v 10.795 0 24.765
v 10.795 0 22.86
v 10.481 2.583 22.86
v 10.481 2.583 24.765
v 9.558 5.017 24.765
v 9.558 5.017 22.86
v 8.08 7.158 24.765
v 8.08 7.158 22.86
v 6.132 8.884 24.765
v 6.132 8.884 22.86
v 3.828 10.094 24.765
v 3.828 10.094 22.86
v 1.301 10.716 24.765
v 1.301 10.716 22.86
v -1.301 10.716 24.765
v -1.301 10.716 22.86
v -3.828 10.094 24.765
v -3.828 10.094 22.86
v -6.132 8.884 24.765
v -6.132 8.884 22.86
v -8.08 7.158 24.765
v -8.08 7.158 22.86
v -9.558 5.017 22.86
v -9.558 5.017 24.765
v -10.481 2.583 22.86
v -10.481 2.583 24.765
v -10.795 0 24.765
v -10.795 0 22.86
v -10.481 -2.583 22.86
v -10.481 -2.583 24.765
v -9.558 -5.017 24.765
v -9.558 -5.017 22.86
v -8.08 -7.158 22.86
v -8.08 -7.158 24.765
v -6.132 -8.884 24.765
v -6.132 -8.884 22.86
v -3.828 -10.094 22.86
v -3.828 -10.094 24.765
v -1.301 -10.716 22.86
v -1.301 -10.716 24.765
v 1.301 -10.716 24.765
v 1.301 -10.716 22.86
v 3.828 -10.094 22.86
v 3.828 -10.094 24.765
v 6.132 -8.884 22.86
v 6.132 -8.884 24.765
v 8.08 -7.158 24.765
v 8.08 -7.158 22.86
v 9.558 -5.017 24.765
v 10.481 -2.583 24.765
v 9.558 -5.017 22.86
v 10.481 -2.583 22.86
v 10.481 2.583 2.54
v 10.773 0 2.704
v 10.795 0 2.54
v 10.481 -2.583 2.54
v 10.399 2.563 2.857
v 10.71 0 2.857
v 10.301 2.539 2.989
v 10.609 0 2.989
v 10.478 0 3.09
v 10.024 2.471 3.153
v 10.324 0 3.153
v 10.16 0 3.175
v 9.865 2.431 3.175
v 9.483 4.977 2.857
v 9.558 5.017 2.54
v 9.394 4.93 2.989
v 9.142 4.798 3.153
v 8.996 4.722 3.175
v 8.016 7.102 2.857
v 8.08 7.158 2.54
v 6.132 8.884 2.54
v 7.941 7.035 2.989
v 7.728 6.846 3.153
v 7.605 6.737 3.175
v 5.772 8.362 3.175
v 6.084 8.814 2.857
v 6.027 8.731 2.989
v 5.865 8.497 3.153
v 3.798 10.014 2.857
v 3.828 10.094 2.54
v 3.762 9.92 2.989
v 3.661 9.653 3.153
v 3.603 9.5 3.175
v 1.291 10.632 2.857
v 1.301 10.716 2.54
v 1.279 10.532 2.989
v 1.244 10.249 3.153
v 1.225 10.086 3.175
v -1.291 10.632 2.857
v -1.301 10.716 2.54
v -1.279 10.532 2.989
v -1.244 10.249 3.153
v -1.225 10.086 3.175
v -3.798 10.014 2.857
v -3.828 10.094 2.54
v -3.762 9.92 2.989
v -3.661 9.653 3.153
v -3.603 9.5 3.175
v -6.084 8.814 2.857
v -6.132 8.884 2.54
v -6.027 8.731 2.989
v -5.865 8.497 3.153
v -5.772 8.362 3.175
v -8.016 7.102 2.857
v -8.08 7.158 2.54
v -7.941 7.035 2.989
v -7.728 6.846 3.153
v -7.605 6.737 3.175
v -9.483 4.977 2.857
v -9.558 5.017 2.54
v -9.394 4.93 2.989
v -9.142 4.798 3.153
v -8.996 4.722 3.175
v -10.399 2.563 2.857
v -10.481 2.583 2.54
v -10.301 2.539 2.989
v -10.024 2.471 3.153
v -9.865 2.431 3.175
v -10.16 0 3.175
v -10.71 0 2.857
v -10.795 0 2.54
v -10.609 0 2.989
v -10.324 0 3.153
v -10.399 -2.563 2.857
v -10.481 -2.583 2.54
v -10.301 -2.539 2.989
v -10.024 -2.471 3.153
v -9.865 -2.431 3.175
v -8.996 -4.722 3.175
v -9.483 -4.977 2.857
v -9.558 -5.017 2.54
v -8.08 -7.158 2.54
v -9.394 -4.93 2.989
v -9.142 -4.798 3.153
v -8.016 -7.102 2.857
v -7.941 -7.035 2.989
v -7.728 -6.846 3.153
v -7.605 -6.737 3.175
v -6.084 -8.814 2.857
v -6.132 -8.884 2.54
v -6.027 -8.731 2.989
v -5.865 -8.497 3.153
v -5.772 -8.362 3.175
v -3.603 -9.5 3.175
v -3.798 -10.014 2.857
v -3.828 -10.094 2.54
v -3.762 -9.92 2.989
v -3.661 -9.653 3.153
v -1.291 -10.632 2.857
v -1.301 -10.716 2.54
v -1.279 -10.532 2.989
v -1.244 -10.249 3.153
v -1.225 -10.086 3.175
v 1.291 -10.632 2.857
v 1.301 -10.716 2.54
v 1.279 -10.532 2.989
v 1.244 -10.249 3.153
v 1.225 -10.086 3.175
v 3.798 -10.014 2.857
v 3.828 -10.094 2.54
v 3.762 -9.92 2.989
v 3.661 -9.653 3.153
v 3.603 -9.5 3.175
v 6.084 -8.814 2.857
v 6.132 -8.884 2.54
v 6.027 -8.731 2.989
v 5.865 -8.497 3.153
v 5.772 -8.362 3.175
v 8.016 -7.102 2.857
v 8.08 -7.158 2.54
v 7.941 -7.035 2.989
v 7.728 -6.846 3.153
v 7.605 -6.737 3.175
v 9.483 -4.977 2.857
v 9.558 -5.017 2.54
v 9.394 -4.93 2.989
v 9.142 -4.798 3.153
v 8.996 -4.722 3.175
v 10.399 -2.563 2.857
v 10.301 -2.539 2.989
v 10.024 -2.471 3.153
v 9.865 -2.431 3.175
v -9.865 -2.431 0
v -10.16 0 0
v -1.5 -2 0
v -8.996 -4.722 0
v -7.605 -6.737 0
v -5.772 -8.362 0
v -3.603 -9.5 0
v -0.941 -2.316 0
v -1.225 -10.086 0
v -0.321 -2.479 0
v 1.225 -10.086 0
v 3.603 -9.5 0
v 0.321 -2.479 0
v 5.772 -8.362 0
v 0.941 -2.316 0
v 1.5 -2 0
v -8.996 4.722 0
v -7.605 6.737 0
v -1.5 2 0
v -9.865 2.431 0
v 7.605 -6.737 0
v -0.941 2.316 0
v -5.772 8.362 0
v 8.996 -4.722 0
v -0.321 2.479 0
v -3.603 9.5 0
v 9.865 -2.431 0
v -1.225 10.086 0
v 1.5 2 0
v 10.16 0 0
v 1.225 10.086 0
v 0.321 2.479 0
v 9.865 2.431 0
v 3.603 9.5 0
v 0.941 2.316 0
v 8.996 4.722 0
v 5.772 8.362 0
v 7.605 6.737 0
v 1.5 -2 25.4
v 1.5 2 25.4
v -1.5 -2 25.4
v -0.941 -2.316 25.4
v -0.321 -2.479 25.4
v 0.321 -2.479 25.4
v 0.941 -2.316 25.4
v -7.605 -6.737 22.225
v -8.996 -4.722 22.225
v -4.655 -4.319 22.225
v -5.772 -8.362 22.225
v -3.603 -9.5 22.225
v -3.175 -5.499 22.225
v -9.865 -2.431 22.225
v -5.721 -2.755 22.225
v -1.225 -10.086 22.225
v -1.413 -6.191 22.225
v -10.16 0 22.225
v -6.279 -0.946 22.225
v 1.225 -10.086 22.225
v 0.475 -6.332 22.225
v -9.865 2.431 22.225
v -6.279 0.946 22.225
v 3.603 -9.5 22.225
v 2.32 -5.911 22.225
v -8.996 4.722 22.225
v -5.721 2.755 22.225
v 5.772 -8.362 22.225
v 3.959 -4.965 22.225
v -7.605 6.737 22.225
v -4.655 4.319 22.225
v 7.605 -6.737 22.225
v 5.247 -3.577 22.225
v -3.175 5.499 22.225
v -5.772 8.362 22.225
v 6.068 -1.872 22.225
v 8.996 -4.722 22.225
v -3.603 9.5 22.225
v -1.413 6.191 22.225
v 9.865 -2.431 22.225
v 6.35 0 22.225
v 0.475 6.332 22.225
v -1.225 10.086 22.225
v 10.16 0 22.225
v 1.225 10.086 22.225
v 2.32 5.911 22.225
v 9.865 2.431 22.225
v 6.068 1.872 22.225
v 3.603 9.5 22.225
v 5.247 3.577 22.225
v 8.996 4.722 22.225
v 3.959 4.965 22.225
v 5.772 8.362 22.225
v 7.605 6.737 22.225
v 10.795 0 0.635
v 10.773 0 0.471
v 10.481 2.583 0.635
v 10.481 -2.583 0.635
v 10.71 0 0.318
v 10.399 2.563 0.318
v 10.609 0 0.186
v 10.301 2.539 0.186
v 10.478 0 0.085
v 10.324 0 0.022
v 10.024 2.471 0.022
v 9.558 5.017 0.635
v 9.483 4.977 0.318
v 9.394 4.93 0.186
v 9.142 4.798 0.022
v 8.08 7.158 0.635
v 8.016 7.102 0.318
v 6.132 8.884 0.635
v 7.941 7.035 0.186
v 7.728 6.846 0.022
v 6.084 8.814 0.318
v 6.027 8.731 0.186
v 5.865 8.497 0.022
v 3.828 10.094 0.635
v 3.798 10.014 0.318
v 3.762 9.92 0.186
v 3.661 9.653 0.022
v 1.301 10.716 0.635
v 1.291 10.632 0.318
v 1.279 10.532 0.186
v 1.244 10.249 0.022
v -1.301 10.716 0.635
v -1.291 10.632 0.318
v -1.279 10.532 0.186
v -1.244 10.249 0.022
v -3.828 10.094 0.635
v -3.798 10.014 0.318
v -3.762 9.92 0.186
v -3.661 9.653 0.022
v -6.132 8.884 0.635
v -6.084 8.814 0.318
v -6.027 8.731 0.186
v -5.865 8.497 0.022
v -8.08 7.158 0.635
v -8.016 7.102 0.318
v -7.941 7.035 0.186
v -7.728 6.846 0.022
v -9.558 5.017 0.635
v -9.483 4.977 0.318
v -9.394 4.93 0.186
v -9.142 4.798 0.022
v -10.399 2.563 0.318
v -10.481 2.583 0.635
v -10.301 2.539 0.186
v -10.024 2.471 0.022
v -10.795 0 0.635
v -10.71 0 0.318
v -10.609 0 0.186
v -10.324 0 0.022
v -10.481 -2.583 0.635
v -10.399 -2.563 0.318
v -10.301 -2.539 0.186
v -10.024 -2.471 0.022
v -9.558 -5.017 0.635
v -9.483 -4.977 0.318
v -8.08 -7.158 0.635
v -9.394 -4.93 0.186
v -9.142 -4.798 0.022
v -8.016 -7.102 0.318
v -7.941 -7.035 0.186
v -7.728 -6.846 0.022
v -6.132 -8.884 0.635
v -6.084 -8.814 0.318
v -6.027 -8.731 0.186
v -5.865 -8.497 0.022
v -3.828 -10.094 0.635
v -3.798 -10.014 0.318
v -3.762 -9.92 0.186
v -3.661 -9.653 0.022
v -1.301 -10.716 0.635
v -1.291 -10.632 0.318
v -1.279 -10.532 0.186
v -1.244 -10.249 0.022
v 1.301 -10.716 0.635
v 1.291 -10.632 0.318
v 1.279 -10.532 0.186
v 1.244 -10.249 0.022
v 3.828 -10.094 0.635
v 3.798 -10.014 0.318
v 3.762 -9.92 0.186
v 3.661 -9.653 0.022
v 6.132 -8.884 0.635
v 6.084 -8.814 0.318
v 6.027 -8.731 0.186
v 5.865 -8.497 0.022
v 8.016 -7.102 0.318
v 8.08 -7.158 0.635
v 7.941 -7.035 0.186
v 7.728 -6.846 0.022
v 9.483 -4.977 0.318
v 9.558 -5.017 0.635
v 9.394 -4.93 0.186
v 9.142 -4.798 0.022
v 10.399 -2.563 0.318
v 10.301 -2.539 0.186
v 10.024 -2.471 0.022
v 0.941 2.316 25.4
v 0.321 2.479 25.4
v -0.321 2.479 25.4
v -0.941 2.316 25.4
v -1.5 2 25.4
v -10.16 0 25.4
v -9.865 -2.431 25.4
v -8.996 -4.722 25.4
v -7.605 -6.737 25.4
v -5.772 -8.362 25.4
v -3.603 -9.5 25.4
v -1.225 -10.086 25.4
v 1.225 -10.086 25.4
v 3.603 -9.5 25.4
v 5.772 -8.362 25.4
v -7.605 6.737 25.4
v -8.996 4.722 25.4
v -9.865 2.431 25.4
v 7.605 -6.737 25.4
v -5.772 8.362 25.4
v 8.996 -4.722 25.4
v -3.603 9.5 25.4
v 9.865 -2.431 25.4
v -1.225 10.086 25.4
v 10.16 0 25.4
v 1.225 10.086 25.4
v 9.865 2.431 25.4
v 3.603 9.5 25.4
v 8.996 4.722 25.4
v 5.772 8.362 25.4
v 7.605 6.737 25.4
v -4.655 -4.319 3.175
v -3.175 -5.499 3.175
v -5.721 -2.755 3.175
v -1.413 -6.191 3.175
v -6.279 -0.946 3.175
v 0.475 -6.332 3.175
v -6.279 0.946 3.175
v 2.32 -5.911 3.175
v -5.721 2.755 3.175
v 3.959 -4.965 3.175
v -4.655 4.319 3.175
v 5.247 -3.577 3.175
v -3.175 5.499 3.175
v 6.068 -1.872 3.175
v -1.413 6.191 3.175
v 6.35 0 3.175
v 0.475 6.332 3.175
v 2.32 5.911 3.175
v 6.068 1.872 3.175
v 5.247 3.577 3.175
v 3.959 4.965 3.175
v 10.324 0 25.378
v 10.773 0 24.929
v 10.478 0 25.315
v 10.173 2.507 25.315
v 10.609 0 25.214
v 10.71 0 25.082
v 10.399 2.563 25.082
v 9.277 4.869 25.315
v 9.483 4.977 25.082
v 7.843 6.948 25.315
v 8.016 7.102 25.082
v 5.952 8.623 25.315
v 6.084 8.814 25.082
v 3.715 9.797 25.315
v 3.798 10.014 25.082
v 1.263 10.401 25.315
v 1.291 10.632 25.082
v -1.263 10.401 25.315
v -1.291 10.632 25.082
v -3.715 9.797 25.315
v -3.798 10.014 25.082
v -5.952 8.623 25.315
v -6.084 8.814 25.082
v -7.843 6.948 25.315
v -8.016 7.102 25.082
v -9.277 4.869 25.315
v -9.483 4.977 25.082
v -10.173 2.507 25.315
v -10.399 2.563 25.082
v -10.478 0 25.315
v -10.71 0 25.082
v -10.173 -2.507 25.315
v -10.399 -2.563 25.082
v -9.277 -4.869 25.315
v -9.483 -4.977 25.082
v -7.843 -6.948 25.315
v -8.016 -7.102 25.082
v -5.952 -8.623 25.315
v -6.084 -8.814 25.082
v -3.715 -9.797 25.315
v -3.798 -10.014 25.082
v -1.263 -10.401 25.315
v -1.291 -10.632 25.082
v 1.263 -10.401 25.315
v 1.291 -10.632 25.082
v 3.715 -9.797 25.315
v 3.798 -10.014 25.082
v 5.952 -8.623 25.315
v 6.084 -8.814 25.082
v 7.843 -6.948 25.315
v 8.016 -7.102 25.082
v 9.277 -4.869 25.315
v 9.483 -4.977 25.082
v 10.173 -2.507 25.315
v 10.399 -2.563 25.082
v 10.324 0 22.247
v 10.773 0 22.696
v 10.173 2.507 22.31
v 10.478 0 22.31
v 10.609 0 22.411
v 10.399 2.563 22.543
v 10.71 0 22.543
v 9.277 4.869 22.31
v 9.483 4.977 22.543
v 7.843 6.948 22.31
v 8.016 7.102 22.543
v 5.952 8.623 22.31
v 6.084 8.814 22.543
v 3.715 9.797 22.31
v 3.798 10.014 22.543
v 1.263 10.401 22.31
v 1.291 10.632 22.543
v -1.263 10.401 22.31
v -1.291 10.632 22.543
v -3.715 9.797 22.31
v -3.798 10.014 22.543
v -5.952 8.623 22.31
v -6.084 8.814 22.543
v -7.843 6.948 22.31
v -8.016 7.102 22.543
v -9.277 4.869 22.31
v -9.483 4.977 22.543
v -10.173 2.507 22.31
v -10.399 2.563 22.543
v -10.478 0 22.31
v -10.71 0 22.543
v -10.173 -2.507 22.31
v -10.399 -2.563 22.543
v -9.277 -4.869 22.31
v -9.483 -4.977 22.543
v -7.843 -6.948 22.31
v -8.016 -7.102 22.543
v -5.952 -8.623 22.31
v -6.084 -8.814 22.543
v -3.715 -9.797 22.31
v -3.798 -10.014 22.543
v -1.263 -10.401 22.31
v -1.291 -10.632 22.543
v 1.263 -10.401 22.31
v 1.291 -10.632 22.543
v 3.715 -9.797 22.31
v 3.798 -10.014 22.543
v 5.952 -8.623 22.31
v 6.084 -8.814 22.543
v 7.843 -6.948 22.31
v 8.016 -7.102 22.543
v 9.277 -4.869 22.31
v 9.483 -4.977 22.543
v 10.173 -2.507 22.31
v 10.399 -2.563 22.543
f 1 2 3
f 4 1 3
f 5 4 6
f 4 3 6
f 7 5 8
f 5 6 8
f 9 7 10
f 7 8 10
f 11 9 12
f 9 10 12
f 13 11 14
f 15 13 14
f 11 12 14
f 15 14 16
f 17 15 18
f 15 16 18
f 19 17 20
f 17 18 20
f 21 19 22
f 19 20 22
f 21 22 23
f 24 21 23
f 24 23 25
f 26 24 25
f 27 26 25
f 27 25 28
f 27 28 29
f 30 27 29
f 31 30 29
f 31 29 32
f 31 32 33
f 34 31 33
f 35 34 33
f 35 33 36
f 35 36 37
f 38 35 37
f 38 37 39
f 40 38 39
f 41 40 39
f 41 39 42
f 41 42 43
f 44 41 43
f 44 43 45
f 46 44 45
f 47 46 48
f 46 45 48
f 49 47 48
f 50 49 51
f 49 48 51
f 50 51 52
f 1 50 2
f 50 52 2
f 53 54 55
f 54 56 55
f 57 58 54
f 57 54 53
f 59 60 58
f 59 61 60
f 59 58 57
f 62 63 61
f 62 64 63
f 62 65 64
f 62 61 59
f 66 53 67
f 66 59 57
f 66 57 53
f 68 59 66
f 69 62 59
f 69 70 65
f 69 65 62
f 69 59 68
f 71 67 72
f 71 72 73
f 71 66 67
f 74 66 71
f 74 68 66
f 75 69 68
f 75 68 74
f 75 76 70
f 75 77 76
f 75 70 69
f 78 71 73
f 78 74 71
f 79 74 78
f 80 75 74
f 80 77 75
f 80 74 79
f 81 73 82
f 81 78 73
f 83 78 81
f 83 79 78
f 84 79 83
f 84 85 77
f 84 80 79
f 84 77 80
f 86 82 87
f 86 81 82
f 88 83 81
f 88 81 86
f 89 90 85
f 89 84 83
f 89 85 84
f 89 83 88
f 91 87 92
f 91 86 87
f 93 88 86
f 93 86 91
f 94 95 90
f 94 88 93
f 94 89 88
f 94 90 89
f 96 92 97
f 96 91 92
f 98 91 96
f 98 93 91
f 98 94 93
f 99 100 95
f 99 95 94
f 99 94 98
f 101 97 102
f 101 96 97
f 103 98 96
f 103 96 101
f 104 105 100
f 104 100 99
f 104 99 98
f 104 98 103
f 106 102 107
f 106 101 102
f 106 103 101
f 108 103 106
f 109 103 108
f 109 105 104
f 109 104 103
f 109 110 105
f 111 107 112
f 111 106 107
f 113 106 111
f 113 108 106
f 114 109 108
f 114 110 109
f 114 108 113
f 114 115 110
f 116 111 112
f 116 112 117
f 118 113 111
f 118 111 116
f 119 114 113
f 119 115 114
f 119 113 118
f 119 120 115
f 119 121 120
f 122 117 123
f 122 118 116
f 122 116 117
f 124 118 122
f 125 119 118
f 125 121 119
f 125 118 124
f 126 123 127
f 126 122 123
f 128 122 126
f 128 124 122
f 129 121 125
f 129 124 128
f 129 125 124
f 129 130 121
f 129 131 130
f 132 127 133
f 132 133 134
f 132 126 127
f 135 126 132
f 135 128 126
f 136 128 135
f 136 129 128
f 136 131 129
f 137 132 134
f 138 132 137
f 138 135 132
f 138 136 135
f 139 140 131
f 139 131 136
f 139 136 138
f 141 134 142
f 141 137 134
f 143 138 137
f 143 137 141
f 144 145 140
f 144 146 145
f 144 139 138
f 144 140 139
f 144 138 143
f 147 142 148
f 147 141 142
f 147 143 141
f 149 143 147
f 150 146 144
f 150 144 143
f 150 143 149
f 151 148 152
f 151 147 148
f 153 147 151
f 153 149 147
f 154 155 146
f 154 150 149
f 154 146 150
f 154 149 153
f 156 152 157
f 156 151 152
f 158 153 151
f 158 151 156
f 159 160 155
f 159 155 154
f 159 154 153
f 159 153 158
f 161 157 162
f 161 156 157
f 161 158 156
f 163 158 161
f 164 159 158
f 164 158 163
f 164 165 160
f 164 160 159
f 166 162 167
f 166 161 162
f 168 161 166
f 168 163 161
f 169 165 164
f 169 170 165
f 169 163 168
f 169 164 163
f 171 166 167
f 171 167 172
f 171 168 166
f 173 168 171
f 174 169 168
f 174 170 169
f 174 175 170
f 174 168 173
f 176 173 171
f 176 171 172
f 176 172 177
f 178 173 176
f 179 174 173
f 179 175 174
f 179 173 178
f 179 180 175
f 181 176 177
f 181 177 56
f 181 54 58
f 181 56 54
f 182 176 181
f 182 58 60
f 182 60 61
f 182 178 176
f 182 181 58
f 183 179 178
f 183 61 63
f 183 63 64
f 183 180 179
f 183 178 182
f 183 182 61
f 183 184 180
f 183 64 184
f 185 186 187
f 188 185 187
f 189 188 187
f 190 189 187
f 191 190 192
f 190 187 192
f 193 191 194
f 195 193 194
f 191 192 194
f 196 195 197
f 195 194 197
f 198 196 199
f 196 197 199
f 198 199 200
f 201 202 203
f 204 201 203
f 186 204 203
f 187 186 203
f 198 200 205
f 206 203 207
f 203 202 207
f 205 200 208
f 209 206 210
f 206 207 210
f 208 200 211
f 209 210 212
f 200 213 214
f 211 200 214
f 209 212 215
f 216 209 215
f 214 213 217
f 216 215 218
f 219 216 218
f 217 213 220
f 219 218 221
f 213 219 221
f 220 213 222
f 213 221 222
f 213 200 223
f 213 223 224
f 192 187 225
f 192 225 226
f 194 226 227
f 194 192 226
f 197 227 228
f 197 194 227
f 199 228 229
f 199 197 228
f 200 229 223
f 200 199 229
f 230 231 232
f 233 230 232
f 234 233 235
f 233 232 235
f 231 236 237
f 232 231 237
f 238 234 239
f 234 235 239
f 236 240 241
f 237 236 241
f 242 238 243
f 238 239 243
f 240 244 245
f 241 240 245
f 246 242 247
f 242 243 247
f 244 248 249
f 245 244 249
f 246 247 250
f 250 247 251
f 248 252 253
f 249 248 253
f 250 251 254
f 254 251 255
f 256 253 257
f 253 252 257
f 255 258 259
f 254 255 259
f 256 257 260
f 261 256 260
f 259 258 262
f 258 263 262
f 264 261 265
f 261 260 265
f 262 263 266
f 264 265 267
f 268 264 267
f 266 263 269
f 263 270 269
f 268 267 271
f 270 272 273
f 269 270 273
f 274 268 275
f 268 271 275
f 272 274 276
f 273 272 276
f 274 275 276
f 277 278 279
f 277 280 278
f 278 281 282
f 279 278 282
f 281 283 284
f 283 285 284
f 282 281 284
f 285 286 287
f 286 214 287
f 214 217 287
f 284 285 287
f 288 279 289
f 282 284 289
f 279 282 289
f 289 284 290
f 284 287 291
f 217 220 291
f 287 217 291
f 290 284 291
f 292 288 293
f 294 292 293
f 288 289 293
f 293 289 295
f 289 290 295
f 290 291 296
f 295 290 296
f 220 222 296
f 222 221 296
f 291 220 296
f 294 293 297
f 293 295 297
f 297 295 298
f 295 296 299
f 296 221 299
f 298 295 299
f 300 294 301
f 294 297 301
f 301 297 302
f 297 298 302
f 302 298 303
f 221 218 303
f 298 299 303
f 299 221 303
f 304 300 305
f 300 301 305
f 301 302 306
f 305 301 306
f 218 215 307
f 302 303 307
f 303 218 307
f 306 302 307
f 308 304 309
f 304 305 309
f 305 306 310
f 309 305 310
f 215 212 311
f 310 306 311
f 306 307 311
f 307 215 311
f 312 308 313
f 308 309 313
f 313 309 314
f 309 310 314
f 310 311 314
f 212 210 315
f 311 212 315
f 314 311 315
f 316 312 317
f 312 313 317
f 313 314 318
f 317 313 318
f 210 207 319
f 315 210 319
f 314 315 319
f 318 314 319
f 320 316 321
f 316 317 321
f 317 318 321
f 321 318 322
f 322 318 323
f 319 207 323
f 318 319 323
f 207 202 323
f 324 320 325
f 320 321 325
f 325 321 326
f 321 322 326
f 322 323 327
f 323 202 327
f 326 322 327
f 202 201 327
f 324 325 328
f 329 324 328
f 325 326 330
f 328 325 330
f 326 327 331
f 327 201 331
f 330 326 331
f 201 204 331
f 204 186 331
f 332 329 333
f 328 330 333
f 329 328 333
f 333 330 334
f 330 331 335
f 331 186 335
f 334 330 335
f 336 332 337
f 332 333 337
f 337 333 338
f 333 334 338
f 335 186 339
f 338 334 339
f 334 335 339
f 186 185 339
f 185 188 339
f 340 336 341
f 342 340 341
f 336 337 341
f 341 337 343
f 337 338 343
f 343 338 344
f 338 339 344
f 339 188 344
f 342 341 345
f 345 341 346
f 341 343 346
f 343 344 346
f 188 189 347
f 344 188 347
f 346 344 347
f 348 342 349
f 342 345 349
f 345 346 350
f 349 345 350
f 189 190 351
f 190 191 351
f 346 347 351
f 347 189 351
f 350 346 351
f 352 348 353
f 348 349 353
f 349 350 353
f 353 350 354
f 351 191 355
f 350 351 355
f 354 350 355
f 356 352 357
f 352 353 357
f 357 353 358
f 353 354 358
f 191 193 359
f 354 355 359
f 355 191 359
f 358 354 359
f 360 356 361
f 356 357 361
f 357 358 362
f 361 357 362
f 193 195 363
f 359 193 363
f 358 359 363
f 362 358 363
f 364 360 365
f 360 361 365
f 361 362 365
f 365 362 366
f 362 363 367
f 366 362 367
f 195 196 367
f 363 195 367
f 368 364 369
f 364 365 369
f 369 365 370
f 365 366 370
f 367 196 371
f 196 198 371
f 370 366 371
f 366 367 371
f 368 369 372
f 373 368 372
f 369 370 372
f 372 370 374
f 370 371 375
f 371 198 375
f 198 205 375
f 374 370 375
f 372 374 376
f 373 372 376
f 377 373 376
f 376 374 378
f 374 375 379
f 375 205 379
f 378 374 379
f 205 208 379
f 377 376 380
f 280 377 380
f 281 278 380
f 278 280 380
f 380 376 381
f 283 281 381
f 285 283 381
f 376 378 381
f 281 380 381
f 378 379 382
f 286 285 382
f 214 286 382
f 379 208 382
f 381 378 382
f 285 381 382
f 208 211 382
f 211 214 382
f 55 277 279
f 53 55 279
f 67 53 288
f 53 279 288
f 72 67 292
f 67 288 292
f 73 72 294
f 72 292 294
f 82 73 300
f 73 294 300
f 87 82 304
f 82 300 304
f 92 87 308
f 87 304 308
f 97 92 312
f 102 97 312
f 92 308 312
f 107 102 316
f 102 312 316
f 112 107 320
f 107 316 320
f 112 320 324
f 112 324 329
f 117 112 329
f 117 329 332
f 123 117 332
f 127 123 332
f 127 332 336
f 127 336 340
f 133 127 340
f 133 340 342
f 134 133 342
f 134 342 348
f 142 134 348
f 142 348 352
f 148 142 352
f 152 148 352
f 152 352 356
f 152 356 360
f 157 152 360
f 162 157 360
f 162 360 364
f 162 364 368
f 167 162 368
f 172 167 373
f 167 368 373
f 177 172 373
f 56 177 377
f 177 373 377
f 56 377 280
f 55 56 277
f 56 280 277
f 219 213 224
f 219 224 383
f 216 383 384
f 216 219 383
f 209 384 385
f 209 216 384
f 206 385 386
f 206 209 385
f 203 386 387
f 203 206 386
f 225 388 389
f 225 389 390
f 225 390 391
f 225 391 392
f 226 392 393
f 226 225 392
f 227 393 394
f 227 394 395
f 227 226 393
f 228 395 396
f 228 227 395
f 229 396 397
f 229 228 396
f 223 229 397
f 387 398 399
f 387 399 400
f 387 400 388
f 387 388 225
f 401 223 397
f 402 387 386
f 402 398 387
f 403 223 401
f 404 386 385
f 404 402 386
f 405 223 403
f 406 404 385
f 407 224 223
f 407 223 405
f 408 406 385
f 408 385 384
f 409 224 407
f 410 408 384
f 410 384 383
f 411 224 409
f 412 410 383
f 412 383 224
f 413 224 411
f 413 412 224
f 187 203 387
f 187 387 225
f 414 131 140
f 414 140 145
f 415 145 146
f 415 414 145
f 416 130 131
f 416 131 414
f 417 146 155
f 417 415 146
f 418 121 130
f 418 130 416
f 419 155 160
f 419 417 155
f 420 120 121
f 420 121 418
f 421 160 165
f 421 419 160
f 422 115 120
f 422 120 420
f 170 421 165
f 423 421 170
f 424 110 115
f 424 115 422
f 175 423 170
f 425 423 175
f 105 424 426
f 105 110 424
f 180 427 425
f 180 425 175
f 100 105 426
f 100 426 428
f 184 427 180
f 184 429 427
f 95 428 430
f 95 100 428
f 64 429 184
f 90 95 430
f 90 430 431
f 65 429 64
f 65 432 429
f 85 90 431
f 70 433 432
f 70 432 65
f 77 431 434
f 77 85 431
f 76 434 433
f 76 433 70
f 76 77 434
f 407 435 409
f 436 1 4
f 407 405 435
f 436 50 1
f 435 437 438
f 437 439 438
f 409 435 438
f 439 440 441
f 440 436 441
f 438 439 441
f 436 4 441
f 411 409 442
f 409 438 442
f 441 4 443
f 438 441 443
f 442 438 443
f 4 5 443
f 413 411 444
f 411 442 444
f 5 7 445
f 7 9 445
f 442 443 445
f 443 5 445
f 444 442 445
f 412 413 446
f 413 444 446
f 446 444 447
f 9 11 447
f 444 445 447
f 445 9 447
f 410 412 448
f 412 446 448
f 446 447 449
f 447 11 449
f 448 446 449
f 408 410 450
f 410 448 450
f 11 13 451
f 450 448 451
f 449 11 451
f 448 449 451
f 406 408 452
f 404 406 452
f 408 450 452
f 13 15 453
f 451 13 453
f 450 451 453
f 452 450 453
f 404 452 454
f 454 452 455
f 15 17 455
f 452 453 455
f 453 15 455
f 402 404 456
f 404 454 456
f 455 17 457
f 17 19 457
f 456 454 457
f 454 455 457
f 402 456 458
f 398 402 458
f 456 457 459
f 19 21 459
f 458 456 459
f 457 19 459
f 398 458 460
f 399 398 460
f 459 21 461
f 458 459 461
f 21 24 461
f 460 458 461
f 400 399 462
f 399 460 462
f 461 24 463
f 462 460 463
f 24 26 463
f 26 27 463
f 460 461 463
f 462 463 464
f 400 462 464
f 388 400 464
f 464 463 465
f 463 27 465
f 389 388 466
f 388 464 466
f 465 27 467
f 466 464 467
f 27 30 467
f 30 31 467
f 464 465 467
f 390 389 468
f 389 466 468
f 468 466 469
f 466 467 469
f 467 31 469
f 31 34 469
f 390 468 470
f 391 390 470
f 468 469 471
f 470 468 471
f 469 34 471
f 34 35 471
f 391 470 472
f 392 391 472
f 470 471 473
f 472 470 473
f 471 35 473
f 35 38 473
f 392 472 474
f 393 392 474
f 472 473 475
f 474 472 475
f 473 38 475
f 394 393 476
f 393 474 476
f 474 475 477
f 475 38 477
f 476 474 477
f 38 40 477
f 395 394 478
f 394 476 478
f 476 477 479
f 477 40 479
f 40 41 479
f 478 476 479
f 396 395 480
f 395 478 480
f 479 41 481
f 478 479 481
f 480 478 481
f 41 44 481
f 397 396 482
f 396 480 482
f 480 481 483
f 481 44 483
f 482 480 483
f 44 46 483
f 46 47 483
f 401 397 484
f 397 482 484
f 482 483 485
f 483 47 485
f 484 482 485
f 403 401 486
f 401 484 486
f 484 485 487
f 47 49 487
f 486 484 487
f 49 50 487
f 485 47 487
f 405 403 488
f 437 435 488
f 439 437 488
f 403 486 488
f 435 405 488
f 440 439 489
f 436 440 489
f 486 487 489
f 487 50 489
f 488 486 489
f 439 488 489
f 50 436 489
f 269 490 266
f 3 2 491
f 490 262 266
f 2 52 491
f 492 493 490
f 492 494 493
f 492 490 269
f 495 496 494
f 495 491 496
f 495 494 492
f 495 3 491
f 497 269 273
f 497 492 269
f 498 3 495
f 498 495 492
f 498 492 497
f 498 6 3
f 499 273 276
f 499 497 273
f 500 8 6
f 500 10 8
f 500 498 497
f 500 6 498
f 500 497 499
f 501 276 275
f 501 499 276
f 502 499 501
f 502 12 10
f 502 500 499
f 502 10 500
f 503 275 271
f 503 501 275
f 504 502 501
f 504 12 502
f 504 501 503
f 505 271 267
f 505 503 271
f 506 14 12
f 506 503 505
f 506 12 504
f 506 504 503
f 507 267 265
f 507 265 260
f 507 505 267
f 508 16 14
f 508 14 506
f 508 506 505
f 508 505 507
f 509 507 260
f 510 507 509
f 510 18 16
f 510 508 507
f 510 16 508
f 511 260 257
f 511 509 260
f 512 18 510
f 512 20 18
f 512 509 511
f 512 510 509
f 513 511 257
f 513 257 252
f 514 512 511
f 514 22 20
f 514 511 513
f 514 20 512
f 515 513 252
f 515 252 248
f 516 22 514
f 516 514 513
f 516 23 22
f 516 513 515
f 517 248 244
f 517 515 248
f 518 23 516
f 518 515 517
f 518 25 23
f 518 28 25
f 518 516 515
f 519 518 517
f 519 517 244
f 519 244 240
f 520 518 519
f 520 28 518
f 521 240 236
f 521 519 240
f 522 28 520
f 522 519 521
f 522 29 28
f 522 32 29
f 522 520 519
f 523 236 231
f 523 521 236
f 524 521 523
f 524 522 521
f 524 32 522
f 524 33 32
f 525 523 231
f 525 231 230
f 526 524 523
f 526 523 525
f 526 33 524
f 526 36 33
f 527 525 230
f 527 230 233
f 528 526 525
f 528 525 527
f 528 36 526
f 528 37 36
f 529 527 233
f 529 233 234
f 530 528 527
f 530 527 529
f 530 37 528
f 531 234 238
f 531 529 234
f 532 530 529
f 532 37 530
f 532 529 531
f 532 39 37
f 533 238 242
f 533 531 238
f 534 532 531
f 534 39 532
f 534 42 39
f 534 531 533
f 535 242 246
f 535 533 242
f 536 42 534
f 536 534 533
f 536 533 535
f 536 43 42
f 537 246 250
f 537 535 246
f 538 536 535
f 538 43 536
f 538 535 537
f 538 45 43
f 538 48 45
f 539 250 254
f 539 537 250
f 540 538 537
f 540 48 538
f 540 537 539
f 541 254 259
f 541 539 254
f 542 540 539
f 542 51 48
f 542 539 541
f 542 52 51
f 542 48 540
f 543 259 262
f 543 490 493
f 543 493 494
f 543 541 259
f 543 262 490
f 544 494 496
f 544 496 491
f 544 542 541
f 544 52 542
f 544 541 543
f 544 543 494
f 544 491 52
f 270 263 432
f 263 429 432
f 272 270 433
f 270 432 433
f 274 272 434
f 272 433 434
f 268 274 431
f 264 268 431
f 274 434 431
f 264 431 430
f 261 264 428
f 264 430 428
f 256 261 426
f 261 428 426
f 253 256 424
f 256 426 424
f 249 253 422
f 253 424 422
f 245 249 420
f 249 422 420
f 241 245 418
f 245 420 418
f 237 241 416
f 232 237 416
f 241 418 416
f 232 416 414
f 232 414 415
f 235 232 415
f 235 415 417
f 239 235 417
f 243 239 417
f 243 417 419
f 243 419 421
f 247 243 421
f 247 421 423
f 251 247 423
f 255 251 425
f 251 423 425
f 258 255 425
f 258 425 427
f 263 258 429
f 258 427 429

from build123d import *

# Parameters (mm, degrees)
SKETCH1_R           = 10.795
BOSS_EXTRUDE1_DEPTH = 25.4
SKETCH2_R           = 10.795
SKETCH2_R_2         = 6.35
CUT_EXTRUDE1_DEPTH  = 9.525
FILLET3_R           = 0.635


with BuildPart() as part:
    # Sketch1 → Boss-Extrude1 (new body)
    with BuildSketch(Plane.XY):
        Circle(SKETCH1_R)
        with BuildLine():
            Line((1.5, -2), (1.5, 2))
            ThreePointArc((1.5, 2), (0, 2.5), (-1.5, 2))
            Line((-1.5, 2), (-1.5, -2))
            ThreePointArc((-1.5, -2), (0, -2.5), (1.5, -2))
        make_face(mode=Mode.SUBTRACT)
    extrude(amount=BOSS_EXTRUDE1_DEPTH)

    # Sketch2 → Cut-Extrude1 (cut, symmetric)
    with BuildSketch(Plane.XY.offset(12.7)):
        Circle(SKETCH2_R)
        Circle(SKETCH2_R_2, mode=Mode.SUBTRACT)
    extrude(amount=CUT_EXTRUDE1_DEPTH, both=True, mode=Mode.SUBTRACT)

    # Fillet3
    fillet3_edges = [part.edges().sort_by_distance(p)[0] for p in [
        (-10.795, 0, 0),
        (-10.795, 0, 3.175),
        (-10.795, 0, 22.225),
        (-10.795, 0, 25.4),
    ]]
    fillet(fillet3_edges, radius=FILLET3_R)


solid = part.part
